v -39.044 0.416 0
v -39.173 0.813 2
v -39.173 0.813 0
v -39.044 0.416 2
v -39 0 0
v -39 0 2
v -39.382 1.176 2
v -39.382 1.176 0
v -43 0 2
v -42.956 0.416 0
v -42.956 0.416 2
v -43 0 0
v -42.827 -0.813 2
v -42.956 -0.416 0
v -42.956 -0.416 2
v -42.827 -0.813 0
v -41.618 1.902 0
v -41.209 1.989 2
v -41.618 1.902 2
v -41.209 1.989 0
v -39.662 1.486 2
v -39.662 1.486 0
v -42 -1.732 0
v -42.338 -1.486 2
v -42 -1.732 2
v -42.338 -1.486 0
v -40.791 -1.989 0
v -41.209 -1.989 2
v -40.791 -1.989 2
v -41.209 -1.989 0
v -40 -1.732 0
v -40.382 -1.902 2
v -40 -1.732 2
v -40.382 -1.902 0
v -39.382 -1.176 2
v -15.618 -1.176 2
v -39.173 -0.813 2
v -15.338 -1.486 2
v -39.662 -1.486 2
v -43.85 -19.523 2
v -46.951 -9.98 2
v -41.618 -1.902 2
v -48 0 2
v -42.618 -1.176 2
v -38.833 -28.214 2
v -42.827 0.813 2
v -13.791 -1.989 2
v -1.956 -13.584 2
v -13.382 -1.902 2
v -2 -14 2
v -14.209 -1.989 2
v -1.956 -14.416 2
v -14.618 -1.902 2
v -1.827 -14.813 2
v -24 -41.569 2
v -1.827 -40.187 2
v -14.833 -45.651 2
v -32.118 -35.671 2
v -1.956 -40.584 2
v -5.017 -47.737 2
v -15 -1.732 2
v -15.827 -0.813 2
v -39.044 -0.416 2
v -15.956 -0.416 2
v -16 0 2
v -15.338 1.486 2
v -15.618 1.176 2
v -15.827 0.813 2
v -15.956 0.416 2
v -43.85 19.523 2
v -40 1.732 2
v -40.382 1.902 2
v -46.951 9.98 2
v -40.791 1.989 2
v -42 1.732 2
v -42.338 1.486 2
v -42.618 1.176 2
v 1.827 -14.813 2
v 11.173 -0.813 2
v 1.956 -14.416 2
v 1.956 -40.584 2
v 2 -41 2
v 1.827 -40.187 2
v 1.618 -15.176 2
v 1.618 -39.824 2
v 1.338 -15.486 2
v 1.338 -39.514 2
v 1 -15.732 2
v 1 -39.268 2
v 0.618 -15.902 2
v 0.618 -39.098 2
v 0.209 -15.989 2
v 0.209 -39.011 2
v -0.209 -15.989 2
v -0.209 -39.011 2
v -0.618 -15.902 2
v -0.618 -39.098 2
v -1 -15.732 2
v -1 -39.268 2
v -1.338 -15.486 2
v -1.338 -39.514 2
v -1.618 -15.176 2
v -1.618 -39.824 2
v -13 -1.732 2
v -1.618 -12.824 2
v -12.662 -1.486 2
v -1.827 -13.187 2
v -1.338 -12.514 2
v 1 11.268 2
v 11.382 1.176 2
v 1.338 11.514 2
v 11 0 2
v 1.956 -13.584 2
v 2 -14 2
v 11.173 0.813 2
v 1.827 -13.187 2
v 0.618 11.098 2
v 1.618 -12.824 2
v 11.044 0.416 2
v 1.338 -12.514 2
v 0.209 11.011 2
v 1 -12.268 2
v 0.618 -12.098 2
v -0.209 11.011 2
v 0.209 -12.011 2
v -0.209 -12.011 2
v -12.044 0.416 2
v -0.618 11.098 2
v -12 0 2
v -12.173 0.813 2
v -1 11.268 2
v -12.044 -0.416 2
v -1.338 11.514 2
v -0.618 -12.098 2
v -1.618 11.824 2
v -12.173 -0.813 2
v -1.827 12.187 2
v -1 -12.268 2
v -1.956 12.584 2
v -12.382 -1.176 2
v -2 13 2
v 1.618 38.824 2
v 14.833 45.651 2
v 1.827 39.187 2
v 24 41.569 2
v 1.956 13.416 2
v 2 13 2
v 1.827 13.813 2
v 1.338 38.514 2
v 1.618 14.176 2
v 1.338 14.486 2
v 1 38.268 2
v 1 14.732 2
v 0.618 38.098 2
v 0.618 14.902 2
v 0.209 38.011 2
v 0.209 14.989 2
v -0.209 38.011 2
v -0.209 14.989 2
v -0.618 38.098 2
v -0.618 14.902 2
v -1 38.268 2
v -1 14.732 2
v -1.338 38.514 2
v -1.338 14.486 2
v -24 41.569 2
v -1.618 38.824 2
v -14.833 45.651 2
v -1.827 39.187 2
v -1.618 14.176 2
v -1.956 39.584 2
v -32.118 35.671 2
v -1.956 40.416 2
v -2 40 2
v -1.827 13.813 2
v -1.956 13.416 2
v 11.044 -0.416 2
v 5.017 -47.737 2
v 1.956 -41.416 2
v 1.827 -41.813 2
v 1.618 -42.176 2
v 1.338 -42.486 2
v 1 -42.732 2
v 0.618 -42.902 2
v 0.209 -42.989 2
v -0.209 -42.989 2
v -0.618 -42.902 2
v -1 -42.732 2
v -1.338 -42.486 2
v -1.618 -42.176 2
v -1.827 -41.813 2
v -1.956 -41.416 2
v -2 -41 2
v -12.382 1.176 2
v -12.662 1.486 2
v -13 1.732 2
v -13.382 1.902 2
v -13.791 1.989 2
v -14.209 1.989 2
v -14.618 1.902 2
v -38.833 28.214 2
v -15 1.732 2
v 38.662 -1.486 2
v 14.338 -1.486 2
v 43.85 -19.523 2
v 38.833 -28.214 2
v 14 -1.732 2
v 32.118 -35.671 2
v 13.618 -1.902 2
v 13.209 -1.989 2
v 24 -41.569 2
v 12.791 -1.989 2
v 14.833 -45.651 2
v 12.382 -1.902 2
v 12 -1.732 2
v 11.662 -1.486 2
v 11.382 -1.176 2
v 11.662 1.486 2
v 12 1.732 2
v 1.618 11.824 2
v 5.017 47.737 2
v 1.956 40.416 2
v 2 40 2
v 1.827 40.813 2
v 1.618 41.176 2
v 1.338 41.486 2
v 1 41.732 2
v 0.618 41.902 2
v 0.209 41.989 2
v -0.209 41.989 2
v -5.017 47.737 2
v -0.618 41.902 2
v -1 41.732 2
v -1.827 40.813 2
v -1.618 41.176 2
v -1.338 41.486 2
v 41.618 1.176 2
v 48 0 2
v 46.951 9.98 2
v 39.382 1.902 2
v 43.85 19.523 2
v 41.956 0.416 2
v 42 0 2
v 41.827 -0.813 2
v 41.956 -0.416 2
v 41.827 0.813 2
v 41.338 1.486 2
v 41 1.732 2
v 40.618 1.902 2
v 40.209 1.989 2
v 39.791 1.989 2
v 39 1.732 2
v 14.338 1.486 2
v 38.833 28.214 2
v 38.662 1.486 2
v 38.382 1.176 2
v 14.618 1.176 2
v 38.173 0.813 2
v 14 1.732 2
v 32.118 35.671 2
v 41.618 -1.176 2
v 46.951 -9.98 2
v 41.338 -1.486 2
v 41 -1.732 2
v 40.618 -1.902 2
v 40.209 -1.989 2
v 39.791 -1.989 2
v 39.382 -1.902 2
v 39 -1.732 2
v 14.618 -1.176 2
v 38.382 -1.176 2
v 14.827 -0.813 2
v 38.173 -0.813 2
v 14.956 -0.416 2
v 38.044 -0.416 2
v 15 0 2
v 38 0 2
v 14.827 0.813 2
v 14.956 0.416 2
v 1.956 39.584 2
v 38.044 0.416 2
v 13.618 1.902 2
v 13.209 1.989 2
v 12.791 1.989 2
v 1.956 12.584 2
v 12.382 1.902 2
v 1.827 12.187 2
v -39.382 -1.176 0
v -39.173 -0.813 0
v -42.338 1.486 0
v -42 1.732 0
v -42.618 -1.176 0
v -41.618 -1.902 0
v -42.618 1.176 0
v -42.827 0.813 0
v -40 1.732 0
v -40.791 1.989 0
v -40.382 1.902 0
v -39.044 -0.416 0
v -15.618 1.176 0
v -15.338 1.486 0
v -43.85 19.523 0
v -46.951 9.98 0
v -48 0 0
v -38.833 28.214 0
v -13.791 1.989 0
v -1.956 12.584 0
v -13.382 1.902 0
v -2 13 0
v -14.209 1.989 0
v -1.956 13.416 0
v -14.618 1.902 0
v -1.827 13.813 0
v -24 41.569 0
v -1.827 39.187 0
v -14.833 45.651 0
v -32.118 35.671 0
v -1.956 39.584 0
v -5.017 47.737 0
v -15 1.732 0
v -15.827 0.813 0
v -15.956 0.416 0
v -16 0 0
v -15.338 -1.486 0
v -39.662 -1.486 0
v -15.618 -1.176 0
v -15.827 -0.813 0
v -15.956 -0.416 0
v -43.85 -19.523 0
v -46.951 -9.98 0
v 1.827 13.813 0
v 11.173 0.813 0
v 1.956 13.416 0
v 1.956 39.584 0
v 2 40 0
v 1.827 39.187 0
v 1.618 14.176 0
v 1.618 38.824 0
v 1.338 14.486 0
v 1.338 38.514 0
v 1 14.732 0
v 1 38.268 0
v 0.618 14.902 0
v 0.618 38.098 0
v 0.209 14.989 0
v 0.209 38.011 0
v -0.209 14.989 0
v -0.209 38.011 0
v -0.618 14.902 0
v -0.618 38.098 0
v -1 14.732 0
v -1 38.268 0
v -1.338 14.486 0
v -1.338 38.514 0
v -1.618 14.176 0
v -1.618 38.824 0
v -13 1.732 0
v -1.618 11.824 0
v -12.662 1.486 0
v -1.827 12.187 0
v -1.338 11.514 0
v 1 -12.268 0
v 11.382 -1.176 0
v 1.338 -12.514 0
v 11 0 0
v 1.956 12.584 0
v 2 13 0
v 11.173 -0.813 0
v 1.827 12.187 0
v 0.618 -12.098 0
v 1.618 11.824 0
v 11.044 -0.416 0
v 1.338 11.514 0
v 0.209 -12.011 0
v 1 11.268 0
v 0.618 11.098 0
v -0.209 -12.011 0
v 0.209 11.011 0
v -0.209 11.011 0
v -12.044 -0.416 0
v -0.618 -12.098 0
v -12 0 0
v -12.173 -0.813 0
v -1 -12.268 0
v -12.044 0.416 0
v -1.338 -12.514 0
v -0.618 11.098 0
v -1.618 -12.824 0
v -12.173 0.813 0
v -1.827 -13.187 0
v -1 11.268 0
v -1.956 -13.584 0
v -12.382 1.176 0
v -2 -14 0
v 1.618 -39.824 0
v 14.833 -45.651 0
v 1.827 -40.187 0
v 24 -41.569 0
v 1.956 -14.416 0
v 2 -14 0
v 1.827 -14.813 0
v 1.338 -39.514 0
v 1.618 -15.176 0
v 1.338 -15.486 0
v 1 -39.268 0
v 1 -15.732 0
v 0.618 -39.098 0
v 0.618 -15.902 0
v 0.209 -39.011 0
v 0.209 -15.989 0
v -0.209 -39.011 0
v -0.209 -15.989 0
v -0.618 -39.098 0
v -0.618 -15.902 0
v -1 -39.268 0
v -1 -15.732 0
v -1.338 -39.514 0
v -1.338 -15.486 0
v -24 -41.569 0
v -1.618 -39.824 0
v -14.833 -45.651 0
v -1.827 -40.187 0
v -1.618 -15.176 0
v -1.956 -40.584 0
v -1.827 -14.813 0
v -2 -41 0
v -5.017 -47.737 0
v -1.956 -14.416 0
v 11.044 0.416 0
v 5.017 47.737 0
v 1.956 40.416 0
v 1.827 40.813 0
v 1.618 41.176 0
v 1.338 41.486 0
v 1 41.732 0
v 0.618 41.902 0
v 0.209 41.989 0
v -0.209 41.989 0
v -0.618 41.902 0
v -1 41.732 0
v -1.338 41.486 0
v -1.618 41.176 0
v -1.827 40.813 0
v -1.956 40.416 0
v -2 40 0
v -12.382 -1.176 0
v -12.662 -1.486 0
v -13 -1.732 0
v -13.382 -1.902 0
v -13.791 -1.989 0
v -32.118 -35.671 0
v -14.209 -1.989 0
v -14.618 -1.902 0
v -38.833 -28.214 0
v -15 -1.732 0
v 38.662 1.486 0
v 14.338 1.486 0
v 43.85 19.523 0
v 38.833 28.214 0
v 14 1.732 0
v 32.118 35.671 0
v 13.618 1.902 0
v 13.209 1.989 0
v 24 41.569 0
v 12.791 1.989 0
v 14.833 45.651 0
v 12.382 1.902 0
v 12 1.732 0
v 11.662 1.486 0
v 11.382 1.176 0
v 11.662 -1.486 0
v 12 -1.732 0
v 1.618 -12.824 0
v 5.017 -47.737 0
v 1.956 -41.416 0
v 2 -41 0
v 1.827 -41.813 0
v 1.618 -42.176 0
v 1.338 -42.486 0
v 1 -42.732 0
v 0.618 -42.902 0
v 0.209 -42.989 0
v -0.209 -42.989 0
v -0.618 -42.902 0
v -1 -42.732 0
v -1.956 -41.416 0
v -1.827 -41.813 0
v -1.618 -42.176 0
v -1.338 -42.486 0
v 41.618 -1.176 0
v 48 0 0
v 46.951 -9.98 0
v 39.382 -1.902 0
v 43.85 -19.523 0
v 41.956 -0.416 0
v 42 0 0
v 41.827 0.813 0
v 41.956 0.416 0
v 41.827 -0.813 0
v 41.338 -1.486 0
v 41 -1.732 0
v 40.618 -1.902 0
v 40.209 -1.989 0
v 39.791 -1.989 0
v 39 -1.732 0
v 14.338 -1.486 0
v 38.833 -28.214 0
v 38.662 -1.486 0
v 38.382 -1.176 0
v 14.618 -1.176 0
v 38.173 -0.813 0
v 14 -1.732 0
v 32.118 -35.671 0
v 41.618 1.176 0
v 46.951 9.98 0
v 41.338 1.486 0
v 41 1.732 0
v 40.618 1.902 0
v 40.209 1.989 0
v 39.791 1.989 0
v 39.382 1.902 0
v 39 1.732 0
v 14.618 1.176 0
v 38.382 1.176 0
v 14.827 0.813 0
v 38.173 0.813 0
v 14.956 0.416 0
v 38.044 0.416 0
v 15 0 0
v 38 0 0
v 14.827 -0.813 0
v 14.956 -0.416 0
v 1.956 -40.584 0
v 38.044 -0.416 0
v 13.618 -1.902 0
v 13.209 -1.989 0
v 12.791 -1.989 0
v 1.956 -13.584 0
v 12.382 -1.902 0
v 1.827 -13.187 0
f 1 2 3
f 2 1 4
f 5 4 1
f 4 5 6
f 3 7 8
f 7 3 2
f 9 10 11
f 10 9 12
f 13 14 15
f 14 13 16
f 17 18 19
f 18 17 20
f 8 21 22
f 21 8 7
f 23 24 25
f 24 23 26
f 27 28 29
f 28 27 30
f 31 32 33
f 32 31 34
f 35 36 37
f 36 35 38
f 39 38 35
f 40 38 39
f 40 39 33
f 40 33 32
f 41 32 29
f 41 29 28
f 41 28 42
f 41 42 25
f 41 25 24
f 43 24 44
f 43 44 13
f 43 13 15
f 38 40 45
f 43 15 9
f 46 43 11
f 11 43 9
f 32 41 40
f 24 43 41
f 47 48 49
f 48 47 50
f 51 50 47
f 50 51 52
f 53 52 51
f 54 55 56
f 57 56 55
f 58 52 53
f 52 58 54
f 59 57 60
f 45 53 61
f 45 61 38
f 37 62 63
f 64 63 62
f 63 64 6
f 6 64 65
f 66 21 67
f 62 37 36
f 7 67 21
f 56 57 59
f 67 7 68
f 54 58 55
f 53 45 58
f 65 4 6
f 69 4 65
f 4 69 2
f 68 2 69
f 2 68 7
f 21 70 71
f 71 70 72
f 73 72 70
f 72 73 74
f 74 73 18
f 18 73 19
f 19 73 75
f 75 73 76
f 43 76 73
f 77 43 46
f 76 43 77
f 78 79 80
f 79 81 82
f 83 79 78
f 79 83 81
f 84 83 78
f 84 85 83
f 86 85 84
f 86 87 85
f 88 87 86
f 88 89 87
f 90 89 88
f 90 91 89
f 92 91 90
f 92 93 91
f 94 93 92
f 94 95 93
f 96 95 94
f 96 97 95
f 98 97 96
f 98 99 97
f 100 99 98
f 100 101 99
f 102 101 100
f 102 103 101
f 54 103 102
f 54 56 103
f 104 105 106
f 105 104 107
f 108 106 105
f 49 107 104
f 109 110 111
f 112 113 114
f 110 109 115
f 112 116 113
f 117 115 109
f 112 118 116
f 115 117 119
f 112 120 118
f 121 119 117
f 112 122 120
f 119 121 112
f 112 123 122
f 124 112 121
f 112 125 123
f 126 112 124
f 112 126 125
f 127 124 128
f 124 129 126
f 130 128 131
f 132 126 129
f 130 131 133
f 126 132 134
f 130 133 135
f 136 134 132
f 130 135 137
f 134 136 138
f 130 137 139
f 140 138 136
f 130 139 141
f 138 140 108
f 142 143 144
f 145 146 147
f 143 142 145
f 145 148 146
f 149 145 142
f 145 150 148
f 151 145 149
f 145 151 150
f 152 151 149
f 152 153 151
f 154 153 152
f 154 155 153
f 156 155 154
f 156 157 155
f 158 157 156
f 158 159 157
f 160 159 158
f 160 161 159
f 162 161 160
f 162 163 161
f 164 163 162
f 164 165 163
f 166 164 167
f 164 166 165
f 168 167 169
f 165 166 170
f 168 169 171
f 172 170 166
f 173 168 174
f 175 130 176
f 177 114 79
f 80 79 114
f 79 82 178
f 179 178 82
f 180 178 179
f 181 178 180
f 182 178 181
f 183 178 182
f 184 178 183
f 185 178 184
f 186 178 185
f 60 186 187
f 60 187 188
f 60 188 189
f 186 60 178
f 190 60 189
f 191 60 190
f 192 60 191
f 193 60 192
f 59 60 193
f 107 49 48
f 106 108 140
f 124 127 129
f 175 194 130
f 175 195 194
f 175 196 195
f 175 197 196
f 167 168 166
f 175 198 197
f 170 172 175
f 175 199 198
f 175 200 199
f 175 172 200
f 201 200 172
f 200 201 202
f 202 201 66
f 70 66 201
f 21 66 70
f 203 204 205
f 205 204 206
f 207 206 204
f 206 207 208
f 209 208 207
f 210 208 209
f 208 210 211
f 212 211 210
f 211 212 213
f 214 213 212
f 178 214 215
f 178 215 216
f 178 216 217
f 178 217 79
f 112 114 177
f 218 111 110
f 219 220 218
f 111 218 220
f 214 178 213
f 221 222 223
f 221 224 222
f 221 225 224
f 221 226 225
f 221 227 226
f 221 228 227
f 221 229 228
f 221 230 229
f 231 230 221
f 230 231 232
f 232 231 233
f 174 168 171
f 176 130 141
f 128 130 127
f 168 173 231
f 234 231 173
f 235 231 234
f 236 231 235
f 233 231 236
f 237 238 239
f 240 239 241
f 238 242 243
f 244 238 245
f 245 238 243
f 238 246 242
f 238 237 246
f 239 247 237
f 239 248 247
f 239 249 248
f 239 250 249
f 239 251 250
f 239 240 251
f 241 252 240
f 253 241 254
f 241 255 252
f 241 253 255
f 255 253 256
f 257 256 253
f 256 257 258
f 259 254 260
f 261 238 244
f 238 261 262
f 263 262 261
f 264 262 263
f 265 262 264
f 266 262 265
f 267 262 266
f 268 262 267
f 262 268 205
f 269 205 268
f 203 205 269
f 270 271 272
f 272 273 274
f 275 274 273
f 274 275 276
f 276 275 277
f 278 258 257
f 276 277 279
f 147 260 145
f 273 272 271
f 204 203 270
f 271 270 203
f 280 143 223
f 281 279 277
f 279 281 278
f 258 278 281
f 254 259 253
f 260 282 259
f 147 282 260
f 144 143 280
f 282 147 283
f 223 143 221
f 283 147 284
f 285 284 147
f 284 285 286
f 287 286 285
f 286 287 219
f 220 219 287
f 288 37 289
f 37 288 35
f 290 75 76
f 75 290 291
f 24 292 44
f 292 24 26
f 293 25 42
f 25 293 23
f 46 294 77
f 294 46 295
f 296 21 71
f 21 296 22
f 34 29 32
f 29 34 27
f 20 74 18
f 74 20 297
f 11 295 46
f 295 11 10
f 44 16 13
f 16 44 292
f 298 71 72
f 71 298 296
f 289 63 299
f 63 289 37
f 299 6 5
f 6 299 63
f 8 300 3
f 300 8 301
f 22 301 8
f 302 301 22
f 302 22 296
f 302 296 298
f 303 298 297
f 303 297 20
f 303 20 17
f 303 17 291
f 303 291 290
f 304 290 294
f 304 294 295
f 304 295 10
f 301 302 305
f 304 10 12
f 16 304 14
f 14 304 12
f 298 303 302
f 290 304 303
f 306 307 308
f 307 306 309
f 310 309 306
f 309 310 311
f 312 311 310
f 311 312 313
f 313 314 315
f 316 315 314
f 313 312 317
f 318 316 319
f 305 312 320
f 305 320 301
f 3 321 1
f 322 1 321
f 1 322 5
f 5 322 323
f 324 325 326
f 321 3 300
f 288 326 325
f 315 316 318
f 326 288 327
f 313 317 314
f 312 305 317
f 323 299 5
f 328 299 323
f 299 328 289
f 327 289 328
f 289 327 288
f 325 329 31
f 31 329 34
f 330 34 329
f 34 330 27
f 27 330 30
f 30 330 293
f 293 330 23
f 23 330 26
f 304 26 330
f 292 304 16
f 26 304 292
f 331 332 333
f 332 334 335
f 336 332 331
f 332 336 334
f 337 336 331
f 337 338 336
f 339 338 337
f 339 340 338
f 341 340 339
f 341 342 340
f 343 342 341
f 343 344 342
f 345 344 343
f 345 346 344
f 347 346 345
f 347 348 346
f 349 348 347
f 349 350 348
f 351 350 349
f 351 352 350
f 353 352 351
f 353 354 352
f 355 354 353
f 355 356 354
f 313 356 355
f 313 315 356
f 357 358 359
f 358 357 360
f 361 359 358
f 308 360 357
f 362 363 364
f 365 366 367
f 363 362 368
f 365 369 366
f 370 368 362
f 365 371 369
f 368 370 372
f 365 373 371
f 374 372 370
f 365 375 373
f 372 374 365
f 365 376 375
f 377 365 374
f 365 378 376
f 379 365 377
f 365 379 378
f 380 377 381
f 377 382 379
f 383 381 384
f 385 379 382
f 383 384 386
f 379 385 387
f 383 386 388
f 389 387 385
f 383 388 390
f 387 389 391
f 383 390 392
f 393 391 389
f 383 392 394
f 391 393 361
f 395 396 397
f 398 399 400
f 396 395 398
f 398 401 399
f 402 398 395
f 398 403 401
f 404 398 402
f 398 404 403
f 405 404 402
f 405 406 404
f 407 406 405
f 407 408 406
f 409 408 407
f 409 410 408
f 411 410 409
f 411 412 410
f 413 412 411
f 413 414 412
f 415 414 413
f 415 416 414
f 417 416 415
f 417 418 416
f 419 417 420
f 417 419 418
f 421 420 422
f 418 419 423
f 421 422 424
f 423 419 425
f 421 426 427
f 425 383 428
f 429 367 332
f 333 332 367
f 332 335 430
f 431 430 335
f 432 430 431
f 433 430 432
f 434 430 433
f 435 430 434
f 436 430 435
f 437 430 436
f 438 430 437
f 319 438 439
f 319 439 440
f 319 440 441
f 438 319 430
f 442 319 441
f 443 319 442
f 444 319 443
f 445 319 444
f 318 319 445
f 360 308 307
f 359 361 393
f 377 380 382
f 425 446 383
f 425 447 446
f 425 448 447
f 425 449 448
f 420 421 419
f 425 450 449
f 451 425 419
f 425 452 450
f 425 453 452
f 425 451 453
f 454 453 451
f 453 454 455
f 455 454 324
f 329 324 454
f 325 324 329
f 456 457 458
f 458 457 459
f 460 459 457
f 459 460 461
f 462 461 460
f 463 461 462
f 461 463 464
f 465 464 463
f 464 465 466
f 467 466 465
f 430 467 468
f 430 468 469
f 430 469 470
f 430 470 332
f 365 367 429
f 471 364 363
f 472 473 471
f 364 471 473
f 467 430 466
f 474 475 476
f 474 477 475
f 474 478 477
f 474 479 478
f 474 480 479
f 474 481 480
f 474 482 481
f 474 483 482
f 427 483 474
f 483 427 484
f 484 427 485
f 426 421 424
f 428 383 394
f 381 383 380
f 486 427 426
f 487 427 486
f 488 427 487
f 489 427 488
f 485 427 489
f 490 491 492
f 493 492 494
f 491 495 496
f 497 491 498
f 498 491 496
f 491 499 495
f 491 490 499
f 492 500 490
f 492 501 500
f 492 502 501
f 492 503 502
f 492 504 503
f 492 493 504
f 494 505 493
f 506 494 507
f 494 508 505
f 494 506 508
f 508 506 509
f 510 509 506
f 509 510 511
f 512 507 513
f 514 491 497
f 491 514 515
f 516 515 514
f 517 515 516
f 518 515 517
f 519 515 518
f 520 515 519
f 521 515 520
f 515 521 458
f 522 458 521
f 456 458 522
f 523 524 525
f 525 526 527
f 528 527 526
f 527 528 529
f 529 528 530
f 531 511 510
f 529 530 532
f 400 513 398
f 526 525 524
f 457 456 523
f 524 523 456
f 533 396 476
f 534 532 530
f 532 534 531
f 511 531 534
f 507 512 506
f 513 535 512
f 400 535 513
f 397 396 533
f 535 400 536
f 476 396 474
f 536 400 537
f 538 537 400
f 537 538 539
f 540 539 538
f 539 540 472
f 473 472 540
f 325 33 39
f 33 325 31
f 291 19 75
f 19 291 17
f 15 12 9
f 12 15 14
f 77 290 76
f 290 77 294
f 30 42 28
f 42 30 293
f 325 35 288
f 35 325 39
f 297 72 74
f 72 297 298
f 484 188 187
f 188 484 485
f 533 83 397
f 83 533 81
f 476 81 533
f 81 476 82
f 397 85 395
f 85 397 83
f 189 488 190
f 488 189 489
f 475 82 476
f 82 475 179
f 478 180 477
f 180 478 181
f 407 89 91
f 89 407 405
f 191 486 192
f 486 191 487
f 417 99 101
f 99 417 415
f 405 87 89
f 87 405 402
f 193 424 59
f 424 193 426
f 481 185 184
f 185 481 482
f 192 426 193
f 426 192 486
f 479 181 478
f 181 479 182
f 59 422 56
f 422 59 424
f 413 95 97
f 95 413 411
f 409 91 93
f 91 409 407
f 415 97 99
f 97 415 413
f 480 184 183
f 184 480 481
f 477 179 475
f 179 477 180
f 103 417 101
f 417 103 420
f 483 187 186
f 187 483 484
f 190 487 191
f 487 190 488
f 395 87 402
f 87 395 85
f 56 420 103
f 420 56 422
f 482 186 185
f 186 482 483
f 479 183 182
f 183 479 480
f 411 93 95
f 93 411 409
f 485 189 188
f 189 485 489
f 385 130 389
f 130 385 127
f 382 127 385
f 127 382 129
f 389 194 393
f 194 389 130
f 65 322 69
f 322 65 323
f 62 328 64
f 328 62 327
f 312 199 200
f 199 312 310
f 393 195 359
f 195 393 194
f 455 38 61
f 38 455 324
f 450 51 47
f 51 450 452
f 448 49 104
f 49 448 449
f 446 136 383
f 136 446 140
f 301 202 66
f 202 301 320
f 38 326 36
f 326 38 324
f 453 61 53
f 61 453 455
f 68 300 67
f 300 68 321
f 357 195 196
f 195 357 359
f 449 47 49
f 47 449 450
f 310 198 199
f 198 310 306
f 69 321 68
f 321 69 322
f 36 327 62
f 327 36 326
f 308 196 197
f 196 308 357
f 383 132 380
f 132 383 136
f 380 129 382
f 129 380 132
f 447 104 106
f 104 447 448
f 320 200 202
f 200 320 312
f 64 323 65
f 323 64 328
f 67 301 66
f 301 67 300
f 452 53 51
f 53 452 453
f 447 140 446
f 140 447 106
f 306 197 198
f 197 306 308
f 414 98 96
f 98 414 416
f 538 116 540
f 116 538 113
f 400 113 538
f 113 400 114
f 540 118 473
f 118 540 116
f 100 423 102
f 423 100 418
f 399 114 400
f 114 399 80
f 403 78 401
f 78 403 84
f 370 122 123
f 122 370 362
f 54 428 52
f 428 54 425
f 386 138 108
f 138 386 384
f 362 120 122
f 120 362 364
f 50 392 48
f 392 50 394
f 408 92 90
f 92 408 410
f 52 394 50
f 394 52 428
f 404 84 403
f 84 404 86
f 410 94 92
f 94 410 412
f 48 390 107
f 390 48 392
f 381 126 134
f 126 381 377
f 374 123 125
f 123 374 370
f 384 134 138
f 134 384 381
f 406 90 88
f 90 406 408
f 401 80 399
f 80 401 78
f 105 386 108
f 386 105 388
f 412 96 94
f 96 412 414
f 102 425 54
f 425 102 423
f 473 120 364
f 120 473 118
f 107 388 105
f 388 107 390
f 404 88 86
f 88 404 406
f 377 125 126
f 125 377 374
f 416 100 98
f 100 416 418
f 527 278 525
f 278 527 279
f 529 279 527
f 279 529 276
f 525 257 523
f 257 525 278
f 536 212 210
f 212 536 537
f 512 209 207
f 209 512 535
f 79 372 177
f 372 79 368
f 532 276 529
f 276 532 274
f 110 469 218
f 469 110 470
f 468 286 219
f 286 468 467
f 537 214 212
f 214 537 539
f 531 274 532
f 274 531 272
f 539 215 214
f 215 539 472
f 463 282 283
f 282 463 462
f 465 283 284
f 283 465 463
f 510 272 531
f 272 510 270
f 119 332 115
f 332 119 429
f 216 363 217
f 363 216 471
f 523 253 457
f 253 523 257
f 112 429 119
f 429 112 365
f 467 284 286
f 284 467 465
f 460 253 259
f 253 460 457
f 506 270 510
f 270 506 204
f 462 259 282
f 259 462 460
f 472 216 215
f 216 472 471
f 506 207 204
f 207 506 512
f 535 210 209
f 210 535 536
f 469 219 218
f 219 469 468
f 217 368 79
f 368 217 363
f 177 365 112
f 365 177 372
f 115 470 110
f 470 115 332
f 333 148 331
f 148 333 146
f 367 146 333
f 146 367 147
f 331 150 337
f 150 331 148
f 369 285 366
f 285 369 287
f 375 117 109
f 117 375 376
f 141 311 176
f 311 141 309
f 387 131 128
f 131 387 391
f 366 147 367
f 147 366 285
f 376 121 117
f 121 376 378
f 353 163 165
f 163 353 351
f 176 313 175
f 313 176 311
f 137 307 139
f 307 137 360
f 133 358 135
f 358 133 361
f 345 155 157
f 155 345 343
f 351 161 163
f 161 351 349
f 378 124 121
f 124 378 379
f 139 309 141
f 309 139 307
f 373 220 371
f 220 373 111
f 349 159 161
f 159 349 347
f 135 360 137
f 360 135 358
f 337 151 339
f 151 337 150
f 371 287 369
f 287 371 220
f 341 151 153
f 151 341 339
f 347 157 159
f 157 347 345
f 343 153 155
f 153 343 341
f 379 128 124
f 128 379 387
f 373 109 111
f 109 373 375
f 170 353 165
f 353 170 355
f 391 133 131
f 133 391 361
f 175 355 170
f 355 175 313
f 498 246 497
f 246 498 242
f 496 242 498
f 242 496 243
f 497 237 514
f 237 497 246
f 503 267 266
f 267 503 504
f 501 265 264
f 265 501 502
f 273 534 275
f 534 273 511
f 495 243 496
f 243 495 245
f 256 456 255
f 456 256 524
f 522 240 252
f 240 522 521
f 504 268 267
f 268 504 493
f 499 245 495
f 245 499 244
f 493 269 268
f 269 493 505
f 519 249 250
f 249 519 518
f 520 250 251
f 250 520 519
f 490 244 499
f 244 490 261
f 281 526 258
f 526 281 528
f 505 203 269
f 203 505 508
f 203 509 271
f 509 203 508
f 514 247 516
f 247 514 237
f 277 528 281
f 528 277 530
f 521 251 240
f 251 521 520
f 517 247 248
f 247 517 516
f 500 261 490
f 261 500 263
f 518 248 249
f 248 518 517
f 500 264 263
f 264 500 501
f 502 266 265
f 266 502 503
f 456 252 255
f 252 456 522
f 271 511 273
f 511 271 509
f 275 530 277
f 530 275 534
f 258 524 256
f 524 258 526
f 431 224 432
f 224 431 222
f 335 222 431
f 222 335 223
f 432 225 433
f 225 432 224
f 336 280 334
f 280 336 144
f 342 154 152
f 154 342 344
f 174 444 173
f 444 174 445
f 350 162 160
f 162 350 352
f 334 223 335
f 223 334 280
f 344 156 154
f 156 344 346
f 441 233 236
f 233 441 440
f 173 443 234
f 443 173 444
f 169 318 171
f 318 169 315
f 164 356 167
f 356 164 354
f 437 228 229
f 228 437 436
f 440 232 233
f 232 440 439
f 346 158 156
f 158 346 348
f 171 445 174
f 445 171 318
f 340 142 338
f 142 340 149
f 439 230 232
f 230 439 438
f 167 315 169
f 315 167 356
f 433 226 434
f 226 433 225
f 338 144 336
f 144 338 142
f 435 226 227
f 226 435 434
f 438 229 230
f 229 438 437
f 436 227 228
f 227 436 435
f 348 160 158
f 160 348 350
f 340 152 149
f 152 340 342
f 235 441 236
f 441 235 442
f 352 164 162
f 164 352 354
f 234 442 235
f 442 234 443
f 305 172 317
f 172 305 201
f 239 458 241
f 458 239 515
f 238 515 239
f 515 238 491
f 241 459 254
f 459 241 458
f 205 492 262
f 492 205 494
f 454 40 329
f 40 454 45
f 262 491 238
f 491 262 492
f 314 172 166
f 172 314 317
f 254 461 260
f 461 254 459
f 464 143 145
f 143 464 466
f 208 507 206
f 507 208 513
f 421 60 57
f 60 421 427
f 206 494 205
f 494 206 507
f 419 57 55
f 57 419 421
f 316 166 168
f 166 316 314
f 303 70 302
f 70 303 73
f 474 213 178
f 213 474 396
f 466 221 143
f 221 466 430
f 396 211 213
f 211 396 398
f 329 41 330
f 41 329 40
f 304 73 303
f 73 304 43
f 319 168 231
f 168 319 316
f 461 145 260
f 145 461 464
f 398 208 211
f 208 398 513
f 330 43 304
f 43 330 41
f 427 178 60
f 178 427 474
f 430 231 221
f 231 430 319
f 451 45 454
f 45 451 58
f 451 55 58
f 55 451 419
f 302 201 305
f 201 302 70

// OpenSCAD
// Eduardo Blanco Bielsa - UO285176
module cubierta1(h, dg, dp, fn){
    difference(){
        cylinder (h = h, d=dg, $fn=fn);
        
        for (i =[-41: 27 :41 ]) {
            translate([i, 0, 0])
                cylinder (h = h, d=dp, $fn=fn);
            translate([0, i, 0])
                cylinder (h = h, d=dp, $fn=fn);
        }
    }
}

cubierta1(2, 96, 4, 30);
